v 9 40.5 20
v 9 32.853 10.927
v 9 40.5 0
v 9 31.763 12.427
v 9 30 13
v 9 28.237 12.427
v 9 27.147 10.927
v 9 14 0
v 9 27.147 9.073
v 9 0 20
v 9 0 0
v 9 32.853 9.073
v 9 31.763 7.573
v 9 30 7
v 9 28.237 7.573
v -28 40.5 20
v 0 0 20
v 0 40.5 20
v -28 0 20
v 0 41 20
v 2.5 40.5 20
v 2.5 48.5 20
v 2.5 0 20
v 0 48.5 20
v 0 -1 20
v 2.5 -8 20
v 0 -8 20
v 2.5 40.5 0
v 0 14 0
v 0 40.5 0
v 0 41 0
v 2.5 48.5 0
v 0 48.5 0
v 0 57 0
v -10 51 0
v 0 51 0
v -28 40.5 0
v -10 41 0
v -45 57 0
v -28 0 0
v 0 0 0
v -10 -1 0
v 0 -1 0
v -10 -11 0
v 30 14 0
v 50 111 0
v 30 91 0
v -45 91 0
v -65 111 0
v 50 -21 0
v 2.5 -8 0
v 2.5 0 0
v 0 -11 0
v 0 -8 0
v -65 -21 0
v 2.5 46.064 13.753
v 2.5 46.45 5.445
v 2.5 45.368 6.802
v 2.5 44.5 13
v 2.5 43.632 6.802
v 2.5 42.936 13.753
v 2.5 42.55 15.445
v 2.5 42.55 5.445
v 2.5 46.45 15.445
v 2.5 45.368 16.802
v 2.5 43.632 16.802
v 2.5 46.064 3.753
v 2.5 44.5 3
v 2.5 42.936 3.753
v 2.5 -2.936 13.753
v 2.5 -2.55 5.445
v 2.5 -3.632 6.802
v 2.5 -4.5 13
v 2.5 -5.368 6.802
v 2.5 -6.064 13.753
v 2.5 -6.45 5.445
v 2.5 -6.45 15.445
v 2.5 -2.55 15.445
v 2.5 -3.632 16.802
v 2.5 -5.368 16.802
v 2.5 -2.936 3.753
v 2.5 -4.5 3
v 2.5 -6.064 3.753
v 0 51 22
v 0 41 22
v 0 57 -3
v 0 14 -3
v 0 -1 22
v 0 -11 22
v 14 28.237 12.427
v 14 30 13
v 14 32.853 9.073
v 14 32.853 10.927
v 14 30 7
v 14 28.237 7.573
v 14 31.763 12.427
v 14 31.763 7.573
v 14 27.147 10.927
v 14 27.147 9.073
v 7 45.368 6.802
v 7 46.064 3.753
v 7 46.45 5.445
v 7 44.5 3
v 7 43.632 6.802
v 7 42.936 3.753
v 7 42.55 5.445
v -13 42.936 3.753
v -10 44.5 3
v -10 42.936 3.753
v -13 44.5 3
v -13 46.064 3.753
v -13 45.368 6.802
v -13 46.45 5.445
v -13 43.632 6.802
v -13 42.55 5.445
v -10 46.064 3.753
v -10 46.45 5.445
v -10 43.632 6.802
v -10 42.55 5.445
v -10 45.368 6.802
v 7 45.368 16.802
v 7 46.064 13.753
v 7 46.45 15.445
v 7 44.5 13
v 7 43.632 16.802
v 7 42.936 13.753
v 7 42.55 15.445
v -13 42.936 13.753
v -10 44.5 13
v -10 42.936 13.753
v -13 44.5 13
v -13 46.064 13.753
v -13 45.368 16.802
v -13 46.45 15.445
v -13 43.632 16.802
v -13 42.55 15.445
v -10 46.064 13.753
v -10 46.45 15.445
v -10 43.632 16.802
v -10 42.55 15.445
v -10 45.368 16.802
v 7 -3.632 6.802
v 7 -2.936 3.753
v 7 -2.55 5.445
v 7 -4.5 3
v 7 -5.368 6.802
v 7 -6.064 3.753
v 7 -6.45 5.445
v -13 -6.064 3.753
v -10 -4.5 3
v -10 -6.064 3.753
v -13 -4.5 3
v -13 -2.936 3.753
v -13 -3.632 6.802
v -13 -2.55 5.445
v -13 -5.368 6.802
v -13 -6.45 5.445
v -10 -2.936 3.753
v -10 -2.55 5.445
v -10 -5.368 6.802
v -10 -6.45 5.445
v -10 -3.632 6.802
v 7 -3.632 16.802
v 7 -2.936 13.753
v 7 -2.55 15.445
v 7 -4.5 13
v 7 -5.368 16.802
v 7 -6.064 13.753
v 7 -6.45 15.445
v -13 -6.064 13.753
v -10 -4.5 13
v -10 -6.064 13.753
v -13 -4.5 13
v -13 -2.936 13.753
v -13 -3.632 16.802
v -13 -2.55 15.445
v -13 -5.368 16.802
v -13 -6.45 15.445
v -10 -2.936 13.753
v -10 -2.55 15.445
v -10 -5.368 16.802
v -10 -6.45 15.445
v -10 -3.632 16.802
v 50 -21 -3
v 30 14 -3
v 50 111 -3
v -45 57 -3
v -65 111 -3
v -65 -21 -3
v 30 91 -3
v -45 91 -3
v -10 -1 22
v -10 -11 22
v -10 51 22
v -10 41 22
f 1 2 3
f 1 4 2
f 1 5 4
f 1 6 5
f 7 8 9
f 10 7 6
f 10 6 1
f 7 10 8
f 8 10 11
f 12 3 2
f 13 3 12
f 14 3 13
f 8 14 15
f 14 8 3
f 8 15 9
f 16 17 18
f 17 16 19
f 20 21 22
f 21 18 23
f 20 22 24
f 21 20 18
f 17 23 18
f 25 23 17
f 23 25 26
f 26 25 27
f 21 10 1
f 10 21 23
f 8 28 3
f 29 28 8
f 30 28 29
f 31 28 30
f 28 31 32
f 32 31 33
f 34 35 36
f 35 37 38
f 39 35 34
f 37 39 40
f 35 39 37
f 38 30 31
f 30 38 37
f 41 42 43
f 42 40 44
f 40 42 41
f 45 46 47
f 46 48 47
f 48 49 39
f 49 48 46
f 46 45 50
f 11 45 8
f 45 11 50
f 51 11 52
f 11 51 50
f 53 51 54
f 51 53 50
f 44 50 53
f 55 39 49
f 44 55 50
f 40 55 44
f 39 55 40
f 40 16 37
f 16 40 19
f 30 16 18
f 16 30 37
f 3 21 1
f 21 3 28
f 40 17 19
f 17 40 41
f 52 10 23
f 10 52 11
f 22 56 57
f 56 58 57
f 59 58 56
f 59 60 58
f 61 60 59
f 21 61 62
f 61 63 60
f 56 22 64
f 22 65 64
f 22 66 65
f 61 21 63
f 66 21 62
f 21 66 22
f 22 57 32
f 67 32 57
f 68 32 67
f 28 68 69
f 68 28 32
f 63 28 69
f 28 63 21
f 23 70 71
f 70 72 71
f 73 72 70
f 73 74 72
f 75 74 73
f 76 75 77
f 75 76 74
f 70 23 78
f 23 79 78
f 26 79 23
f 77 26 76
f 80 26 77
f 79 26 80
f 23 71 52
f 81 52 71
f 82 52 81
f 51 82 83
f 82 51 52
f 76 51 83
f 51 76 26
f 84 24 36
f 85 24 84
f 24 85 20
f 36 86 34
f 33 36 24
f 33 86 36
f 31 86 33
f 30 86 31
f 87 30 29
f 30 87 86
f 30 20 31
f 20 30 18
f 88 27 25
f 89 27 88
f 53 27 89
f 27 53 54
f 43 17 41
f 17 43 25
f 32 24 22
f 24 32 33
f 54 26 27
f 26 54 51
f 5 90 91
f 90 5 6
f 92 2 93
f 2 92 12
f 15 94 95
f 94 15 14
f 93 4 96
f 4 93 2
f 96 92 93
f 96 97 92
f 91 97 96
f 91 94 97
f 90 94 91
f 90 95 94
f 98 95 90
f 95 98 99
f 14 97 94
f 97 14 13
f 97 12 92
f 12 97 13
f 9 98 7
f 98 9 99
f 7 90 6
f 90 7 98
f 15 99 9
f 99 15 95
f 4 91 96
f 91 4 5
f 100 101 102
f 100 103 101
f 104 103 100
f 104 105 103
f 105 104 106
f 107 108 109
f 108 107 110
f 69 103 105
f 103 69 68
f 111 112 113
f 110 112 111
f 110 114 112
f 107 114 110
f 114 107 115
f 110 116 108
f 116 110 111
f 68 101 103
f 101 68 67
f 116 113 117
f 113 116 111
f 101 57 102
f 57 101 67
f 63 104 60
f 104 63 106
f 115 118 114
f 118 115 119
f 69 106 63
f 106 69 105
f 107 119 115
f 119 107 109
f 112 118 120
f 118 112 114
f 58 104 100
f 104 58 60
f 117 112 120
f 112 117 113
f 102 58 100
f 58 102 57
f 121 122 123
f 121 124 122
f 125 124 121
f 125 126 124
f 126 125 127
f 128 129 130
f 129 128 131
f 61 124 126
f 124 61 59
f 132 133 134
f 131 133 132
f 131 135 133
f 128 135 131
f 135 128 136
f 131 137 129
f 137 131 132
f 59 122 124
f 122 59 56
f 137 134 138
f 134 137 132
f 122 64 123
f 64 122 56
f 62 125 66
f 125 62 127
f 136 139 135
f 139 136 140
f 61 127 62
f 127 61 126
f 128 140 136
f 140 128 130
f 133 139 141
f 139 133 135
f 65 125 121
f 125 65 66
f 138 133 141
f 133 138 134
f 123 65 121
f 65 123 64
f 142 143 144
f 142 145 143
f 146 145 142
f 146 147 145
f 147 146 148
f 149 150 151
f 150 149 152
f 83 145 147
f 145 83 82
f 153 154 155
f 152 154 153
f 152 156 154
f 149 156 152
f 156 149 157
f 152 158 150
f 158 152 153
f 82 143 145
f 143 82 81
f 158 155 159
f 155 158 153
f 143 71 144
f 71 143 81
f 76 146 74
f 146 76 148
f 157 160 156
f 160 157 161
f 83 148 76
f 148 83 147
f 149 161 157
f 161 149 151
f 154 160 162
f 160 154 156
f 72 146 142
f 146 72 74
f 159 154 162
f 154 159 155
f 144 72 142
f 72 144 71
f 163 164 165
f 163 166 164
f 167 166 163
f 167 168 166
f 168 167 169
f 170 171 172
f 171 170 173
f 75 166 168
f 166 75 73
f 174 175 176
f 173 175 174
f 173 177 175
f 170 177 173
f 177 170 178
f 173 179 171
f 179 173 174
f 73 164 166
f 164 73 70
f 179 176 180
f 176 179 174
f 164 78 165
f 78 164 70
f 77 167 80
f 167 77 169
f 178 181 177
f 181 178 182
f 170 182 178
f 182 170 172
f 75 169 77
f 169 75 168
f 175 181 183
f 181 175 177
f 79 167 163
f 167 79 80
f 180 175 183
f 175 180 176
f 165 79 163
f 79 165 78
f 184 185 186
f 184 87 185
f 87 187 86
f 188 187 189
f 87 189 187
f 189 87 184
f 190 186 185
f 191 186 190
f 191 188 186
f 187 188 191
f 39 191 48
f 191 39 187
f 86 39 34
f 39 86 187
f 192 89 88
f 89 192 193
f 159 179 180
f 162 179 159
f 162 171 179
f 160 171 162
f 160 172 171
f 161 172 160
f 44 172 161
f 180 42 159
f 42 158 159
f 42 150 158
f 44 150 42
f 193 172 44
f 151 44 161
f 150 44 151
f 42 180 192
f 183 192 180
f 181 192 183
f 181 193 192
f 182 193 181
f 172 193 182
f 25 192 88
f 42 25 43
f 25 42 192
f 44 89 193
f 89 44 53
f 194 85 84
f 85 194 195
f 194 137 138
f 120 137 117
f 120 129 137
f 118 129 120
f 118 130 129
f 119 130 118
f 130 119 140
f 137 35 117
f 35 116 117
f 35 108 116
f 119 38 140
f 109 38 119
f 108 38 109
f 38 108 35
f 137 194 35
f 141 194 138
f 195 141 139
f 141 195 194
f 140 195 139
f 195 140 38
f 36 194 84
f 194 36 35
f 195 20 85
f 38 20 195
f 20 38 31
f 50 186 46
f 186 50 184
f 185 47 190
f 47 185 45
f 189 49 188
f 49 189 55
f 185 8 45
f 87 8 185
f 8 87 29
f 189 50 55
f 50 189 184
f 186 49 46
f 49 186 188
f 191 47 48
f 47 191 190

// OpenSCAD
module servo() {
 color("red") translate(v=[-28,0,0]) {
  translate(v=[0,0,0]) cube(size=[37,40.5,20]);  
  translate(v=[28,-8,0]) cube(size=[2.5,56.5,20]);
  translate(v=[36,30,10]) rotate(v=[0,1,0],a=90) cylinder(h=6,r=3);  

  translate(v=[15,44.5,5]) rotate(v=[0,1,0],a=90) cylinder(r=2,h=20);
  translate(v=[15,44.5,15]) rotate(v=[0,1,0],a=90) cylinder(r=2,h=20);
  translate(v=[15,-4.5,5]) rotate(v=[0,1,0],a=90) cylinder(r=2,h=20);
  translate(v=[15,-4.5,15]) rotate(v=[0,1,0],a=90) cylinder(r=2,h=20);
 }
}

module sled() {
 color("green") {
/*
  translate(v=[-6,44.5,5]) rotate(v=[0,1,0],a=90) cylinder(r=2,h=20);
  translate(v=[-6,44.5,15]) rotate(v=[0,1,0],a=90) cylinder(r=2,h=20);
  translate(v=[-6,-4.5,5]) rotate(v=[0,1,0],a=90) cylinder(r=2,h=20);
  translate(v=[-6,-4.5,15]) rotate(v=[0,1,0],a=90) cylinder(r=2,h=20);

*/
  translate(v=[-45,-15.0,-3]) cube(size=[45,72,3]);
  translate(v=[-10,-11.0,-3]) cube(size=[10,10,25]);
  translate(v=[-10,41.0,-3]) cube(size=[10,10,25]);






 // translate(v=[-15,21.0,-3]) cube(size=[25,62,3]);

  translate(v=[30,-20,-3]) cube(size=[20,130,3]);
  translate(v=[-65,-20,-3]) cube(size=[20,130,3]);

  translate(v=[-65,-21.0,-3]) cube(size=[115,35,3]);
  translate(v=[-65,91.0,-3]) cube(size=[115,20,3]);

 }
}

module penarm() {
}

servo();
sled();
penarm();

/*
difference() {
sled();
servo();
}
*/
